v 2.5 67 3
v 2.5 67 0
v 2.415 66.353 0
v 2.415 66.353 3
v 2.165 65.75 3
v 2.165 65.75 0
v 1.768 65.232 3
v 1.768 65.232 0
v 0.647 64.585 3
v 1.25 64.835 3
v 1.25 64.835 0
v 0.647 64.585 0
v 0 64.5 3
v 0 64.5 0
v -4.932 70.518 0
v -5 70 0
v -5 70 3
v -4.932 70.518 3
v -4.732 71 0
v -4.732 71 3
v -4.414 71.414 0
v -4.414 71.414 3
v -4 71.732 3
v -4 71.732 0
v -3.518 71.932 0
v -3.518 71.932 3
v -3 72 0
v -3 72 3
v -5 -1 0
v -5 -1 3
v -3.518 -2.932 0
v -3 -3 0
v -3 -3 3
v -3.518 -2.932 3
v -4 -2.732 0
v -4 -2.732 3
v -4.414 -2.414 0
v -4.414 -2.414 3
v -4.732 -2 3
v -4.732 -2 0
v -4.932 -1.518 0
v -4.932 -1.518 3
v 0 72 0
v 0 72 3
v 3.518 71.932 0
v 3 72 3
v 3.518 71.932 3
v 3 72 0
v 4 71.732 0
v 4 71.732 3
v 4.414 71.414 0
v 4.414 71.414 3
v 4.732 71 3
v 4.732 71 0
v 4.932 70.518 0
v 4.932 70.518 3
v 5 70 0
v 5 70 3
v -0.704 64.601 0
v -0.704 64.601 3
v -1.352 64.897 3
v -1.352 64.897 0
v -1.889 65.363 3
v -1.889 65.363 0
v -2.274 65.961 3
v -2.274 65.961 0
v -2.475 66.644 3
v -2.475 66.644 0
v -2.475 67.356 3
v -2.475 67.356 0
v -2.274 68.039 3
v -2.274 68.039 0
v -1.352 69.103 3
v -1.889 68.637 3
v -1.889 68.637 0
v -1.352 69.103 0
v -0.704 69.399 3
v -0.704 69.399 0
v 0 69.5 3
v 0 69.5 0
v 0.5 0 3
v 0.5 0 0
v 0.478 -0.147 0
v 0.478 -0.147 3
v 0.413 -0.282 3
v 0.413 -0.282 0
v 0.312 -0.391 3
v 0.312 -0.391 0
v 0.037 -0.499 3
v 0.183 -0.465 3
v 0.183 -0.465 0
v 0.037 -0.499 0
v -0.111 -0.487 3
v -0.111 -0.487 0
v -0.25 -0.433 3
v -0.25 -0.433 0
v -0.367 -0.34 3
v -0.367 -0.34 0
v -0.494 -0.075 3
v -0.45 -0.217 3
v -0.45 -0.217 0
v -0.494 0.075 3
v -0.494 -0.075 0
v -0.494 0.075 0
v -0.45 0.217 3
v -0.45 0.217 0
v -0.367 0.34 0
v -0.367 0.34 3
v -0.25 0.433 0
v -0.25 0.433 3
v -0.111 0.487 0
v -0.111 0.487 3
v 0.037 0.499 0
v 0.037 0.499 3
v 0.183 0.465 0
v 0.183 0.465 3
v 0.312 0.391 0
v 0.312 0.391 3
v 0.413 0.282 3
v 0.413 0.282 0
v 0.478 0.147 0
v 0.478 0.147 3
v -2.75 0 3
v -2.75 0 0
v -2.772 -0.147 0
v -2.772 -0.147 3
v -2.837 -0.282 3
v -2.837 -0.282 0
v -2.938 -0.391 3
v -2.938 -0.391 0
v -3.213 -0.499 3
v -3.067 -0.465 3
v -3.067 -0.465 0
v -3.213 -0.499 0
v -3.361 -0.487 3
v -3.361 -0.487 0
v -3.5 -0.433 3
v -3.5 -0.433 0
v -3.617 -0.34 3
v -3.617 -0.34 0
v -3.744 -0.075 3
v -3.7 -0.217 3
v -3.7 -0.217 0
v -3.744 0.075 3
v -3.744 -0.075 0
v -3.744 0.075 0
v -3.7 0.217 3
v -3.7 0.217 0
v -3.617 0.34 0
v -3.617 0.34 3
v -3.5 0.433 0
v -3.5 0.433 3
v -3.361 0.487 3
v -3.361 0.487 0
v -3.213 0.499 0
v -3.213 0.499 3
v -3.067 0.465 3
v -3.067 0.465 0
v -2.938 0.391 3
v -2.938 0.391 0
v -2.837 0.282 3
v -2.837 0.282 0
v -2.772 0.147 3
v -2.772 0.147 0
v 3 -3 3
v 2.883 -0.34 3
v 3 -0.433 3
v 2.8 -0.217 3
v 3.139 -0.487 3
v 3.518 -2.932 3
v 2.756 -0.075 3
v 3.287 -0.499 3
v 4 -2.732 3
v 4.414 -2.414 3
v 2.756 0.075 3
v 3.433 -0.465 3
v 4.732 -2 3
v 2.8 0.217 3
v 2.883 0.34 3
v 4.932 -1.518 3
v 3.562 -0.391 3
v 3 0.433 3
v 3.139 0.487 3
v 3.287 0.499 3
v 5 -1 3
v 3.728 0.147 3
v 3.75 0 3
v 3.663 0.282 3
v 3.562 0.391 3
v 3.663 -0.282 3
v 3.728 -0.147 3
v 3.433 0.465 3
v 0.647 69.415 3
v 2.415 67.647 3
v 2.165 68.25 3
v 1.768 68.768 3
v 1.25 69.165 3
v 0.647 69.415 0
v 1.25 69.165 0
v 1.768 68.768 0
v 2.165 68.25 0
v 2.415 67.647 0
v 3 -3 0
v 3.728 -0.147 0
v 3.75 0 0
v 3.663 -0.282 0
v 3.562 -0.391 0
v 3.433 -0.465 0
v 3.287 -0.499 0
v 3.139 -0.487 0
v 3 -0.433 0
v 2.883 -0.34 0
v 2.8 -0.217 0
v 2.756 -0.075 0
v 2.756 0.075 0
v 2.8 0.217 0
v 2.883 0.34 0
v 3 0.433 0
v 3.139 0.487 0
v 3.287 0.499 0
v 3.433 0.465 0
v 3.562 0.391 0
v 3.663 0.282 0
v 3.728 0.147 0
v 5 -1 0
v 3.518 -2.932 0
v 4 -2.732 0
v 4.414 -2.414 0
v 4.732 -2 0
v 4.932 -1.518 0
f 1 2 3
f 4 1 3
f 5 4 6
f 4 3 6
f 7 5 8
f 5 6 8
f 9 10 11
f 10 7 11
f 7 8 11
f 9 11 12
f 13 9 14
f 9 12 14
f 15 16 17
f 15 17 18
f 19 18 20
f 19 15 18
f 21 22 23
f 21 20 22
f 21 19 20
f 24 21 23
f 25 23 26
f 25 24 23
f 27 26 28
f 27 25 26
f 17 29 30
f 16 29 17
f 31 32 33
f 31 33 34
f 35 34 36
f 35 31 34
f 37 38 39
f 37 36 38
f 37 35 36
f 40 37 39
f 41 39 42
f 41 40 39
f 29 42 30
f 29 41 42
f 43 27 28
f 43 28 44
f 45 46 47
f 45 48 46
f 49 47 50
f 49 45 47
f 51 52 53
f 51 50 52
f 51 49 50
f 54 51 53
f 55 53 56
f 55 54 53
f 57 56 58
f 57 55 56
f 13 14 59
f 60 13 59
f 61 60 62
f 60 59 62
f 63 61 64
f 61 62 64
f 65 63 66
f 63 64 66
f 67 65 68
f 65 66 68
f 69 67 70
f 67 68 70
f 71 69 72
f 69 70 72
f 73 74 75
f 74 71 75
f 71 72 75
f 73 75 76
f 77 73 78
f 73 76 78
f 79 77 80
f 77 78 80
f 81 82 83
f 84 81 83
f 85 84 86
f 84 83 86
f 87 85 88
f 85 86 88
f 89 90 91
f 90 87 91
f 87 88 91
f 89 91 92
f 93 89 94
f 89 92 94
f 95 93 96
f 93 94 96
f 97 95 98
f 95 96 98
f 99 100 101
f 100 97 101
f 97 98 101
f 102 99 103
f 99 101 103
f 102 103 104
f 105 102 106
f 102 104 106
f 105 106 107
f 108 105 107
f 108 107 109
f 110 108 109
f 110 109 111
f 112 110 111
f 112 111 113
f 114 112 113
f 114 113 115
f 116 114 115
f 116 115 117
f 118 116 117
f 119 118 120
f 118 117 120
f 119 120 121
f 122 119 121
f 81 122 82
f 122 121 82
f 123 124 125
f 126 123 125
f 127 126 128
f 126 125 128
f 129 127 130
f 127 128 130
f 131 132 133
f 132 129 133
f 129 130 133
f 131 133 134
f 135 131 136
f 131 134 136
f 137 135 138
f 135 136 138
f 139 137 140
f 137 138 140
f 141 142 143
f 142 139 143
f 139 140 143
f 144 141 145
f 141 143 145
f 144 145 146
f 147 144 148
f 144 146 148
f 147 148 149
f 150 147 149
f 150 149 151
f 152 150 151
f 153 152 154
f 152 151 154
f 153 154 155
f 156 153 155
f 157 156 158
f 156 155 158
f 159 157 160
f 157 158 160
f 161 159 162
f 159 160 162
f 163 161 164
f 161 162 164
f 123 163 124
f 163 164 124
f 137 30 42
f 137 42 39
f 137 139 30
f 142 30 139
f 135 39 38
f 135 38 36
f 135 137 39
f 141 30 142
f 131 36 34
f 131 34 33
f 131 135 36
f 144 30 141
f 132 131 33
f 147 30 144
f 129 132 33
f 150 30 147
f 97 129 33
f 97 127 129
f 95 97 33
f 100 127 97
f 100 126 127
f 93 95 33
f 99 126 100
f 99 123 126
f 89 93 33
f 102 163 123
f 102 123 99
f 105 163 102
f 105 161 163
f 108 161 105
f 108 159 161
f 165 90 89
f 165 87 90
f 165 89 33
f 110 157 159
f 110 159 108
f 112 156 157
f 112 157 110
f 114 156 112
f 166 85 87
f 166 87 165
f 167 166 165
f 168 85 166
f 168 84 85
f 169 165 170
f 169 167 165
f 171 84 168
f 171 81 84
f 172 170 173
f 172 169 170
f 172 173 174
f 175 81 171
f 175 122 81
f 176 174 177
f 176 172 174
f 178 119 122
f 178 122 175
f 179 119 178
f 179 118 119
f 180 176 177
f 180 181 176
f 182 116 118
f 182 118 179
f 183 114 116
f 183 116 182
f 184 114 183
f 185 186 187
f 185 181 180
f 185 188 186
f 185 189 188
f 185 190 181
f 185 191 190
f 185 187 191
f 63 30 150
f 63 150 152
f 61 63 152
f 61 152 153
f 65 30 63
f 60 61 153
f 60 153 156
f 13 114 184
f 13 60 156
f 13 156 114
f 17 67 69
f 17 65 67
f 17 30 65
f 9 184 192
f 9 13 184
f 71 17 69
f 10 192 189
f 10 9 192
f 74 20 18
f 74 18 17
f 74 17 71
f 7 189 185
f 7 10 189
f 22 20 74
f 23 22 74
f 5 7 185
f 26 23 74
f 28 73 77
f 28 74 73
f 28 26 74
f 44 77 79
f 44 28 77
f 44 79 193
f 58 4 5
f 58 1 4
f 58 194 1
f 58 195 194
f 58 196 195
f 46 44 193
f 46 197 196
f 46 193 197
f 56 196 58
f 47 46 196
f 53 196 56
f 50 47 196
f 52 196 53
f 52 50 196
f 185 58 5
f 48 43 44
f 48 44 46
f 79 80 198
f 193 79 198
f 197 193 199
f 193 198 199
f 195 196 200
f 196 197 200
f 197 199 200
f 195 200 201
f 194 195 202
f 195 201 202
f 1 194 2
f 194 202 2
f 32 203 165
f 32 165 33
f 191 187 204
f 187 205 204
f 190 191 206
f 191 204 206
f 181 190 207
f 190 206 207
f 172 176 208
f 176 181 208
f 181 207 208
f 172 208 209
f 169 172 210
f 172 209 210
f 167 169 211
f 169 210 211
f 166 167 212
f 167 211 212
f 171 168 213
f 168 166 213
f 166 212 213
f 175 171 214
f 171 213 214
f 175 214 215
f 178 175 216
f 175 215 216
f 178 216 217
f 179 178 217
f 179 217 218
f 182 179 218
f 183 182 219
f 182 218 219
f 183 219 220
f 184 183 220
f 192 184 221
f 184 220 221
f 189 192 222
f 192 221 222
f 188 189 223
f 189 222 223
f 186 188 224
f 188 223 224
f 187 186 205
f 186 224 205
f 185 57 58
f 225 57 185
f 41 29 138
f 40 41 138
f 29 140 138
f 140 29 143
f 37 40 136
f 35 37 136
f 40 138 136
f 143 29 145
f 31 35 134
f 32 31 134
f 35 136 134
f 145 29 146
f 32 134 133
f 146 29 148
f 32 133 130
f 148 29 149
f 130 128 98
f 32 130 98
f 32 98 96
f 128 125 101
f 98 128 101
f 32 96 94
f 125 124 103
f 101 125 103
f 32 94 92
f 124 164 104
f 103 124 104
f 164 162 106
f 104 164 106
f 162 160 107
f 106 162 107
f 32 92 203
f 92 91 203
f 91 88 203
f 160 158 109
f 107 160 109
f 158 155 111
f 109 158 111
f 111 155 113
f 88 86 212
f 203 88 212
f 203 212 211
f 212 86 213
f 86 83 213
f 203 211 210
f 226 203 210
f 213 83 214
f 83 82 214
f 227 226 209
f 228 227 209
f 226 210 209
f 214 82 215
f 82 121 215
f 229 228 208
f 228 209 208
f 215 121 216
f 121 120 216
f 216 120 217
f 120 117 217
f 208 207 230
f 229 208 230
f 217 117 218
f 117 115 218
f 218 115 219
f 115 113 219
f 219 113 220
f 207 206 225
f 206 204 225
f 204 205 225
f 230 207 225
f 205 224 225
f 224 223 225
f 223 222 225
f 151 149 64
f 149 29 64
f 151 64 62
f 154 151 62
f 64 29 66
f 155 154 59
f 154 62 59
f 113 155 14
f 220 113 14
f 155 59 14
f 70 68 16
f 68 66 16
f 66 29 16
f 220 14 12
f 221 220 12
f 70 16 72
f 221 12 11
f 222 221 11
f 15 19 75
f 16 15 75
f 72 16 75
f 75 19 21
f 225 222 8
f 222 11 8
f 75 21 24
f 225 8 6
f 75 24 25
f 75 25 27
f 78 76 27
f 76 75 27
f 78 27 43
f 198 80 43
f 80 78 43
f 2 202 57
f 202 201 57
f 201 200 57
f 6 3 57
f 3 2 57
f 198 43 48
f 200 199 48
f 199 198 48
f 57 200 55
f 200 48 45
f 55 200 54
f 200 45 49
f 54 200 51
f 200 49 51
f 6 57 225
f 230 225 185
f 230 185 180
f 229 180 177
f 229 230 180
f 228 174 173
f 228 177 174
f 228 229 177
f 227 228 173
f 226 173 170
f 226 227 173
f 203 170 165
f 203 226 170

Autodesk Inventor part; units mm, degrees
ref_plane "YZ Plane" through (0, 0, 0) normal (1, 0, 0) x (0, 1, 0)
ref_plane "XZ Plane" through (0, 0, 0) normal (0, 1, 0) x (-1, 0, 0)
ref_plane "XY Plane" through (0, 0, 0) normal (0, 0, 1) x (1, 0, 0)
sketch "Sketch1" plane through (0, 0, 0) normal (0, 0, 1) x (1, 0, 0)
  circle A0 centre (0, 0) radius 0.5
  line L0 (-3, 72) -> (3, 72)
  line L1 (5, 70) -> (5, -1)
  line L2 (3, -3) -> (-3, -3)
  line L3 (-5, -1) -> (-5, 70)
  arc A1 (-3, 72) -> (-5, 70) centre (-3, 70) ccw
  arc A2 (5, 70) -> (3, 72) centre (3, 70) ccw
  arc A3 (-5, -1) -> (-3, -3) centre (-3, -1) ccw
  arc A4 (3, -3) -> (5, -1) centre (3, -1) ccw
  circle A5 centre (0, 67) radius 2.5
  line L4 (0, 72) -> (0, 61.8445)
  circle A6 centre (-3.25, 0) radius 0.5
  circle A7 centre (3.25, 0) radius 0.5
  point P0 (-5, 72)
  point P1 (-5, -3)
  point P2 (0, -3)
  dimension "d3" = 1
  dimension "d7" = 75
  dimension "d8" = 10
  dimension "d9" = 3
  dimension "d10" = 2
  dimension "d11" = 5
  dimension "d12" = 5
  dimension "d15" = 1
  dimension "d16" = 1
  dimension "d17" = 3.25
  dimension "d18" = 3.25
extrude "Extrusion1" add sketch "Sketch1" along normal blind 3
properties part number "FP V2 Servo Arm"
